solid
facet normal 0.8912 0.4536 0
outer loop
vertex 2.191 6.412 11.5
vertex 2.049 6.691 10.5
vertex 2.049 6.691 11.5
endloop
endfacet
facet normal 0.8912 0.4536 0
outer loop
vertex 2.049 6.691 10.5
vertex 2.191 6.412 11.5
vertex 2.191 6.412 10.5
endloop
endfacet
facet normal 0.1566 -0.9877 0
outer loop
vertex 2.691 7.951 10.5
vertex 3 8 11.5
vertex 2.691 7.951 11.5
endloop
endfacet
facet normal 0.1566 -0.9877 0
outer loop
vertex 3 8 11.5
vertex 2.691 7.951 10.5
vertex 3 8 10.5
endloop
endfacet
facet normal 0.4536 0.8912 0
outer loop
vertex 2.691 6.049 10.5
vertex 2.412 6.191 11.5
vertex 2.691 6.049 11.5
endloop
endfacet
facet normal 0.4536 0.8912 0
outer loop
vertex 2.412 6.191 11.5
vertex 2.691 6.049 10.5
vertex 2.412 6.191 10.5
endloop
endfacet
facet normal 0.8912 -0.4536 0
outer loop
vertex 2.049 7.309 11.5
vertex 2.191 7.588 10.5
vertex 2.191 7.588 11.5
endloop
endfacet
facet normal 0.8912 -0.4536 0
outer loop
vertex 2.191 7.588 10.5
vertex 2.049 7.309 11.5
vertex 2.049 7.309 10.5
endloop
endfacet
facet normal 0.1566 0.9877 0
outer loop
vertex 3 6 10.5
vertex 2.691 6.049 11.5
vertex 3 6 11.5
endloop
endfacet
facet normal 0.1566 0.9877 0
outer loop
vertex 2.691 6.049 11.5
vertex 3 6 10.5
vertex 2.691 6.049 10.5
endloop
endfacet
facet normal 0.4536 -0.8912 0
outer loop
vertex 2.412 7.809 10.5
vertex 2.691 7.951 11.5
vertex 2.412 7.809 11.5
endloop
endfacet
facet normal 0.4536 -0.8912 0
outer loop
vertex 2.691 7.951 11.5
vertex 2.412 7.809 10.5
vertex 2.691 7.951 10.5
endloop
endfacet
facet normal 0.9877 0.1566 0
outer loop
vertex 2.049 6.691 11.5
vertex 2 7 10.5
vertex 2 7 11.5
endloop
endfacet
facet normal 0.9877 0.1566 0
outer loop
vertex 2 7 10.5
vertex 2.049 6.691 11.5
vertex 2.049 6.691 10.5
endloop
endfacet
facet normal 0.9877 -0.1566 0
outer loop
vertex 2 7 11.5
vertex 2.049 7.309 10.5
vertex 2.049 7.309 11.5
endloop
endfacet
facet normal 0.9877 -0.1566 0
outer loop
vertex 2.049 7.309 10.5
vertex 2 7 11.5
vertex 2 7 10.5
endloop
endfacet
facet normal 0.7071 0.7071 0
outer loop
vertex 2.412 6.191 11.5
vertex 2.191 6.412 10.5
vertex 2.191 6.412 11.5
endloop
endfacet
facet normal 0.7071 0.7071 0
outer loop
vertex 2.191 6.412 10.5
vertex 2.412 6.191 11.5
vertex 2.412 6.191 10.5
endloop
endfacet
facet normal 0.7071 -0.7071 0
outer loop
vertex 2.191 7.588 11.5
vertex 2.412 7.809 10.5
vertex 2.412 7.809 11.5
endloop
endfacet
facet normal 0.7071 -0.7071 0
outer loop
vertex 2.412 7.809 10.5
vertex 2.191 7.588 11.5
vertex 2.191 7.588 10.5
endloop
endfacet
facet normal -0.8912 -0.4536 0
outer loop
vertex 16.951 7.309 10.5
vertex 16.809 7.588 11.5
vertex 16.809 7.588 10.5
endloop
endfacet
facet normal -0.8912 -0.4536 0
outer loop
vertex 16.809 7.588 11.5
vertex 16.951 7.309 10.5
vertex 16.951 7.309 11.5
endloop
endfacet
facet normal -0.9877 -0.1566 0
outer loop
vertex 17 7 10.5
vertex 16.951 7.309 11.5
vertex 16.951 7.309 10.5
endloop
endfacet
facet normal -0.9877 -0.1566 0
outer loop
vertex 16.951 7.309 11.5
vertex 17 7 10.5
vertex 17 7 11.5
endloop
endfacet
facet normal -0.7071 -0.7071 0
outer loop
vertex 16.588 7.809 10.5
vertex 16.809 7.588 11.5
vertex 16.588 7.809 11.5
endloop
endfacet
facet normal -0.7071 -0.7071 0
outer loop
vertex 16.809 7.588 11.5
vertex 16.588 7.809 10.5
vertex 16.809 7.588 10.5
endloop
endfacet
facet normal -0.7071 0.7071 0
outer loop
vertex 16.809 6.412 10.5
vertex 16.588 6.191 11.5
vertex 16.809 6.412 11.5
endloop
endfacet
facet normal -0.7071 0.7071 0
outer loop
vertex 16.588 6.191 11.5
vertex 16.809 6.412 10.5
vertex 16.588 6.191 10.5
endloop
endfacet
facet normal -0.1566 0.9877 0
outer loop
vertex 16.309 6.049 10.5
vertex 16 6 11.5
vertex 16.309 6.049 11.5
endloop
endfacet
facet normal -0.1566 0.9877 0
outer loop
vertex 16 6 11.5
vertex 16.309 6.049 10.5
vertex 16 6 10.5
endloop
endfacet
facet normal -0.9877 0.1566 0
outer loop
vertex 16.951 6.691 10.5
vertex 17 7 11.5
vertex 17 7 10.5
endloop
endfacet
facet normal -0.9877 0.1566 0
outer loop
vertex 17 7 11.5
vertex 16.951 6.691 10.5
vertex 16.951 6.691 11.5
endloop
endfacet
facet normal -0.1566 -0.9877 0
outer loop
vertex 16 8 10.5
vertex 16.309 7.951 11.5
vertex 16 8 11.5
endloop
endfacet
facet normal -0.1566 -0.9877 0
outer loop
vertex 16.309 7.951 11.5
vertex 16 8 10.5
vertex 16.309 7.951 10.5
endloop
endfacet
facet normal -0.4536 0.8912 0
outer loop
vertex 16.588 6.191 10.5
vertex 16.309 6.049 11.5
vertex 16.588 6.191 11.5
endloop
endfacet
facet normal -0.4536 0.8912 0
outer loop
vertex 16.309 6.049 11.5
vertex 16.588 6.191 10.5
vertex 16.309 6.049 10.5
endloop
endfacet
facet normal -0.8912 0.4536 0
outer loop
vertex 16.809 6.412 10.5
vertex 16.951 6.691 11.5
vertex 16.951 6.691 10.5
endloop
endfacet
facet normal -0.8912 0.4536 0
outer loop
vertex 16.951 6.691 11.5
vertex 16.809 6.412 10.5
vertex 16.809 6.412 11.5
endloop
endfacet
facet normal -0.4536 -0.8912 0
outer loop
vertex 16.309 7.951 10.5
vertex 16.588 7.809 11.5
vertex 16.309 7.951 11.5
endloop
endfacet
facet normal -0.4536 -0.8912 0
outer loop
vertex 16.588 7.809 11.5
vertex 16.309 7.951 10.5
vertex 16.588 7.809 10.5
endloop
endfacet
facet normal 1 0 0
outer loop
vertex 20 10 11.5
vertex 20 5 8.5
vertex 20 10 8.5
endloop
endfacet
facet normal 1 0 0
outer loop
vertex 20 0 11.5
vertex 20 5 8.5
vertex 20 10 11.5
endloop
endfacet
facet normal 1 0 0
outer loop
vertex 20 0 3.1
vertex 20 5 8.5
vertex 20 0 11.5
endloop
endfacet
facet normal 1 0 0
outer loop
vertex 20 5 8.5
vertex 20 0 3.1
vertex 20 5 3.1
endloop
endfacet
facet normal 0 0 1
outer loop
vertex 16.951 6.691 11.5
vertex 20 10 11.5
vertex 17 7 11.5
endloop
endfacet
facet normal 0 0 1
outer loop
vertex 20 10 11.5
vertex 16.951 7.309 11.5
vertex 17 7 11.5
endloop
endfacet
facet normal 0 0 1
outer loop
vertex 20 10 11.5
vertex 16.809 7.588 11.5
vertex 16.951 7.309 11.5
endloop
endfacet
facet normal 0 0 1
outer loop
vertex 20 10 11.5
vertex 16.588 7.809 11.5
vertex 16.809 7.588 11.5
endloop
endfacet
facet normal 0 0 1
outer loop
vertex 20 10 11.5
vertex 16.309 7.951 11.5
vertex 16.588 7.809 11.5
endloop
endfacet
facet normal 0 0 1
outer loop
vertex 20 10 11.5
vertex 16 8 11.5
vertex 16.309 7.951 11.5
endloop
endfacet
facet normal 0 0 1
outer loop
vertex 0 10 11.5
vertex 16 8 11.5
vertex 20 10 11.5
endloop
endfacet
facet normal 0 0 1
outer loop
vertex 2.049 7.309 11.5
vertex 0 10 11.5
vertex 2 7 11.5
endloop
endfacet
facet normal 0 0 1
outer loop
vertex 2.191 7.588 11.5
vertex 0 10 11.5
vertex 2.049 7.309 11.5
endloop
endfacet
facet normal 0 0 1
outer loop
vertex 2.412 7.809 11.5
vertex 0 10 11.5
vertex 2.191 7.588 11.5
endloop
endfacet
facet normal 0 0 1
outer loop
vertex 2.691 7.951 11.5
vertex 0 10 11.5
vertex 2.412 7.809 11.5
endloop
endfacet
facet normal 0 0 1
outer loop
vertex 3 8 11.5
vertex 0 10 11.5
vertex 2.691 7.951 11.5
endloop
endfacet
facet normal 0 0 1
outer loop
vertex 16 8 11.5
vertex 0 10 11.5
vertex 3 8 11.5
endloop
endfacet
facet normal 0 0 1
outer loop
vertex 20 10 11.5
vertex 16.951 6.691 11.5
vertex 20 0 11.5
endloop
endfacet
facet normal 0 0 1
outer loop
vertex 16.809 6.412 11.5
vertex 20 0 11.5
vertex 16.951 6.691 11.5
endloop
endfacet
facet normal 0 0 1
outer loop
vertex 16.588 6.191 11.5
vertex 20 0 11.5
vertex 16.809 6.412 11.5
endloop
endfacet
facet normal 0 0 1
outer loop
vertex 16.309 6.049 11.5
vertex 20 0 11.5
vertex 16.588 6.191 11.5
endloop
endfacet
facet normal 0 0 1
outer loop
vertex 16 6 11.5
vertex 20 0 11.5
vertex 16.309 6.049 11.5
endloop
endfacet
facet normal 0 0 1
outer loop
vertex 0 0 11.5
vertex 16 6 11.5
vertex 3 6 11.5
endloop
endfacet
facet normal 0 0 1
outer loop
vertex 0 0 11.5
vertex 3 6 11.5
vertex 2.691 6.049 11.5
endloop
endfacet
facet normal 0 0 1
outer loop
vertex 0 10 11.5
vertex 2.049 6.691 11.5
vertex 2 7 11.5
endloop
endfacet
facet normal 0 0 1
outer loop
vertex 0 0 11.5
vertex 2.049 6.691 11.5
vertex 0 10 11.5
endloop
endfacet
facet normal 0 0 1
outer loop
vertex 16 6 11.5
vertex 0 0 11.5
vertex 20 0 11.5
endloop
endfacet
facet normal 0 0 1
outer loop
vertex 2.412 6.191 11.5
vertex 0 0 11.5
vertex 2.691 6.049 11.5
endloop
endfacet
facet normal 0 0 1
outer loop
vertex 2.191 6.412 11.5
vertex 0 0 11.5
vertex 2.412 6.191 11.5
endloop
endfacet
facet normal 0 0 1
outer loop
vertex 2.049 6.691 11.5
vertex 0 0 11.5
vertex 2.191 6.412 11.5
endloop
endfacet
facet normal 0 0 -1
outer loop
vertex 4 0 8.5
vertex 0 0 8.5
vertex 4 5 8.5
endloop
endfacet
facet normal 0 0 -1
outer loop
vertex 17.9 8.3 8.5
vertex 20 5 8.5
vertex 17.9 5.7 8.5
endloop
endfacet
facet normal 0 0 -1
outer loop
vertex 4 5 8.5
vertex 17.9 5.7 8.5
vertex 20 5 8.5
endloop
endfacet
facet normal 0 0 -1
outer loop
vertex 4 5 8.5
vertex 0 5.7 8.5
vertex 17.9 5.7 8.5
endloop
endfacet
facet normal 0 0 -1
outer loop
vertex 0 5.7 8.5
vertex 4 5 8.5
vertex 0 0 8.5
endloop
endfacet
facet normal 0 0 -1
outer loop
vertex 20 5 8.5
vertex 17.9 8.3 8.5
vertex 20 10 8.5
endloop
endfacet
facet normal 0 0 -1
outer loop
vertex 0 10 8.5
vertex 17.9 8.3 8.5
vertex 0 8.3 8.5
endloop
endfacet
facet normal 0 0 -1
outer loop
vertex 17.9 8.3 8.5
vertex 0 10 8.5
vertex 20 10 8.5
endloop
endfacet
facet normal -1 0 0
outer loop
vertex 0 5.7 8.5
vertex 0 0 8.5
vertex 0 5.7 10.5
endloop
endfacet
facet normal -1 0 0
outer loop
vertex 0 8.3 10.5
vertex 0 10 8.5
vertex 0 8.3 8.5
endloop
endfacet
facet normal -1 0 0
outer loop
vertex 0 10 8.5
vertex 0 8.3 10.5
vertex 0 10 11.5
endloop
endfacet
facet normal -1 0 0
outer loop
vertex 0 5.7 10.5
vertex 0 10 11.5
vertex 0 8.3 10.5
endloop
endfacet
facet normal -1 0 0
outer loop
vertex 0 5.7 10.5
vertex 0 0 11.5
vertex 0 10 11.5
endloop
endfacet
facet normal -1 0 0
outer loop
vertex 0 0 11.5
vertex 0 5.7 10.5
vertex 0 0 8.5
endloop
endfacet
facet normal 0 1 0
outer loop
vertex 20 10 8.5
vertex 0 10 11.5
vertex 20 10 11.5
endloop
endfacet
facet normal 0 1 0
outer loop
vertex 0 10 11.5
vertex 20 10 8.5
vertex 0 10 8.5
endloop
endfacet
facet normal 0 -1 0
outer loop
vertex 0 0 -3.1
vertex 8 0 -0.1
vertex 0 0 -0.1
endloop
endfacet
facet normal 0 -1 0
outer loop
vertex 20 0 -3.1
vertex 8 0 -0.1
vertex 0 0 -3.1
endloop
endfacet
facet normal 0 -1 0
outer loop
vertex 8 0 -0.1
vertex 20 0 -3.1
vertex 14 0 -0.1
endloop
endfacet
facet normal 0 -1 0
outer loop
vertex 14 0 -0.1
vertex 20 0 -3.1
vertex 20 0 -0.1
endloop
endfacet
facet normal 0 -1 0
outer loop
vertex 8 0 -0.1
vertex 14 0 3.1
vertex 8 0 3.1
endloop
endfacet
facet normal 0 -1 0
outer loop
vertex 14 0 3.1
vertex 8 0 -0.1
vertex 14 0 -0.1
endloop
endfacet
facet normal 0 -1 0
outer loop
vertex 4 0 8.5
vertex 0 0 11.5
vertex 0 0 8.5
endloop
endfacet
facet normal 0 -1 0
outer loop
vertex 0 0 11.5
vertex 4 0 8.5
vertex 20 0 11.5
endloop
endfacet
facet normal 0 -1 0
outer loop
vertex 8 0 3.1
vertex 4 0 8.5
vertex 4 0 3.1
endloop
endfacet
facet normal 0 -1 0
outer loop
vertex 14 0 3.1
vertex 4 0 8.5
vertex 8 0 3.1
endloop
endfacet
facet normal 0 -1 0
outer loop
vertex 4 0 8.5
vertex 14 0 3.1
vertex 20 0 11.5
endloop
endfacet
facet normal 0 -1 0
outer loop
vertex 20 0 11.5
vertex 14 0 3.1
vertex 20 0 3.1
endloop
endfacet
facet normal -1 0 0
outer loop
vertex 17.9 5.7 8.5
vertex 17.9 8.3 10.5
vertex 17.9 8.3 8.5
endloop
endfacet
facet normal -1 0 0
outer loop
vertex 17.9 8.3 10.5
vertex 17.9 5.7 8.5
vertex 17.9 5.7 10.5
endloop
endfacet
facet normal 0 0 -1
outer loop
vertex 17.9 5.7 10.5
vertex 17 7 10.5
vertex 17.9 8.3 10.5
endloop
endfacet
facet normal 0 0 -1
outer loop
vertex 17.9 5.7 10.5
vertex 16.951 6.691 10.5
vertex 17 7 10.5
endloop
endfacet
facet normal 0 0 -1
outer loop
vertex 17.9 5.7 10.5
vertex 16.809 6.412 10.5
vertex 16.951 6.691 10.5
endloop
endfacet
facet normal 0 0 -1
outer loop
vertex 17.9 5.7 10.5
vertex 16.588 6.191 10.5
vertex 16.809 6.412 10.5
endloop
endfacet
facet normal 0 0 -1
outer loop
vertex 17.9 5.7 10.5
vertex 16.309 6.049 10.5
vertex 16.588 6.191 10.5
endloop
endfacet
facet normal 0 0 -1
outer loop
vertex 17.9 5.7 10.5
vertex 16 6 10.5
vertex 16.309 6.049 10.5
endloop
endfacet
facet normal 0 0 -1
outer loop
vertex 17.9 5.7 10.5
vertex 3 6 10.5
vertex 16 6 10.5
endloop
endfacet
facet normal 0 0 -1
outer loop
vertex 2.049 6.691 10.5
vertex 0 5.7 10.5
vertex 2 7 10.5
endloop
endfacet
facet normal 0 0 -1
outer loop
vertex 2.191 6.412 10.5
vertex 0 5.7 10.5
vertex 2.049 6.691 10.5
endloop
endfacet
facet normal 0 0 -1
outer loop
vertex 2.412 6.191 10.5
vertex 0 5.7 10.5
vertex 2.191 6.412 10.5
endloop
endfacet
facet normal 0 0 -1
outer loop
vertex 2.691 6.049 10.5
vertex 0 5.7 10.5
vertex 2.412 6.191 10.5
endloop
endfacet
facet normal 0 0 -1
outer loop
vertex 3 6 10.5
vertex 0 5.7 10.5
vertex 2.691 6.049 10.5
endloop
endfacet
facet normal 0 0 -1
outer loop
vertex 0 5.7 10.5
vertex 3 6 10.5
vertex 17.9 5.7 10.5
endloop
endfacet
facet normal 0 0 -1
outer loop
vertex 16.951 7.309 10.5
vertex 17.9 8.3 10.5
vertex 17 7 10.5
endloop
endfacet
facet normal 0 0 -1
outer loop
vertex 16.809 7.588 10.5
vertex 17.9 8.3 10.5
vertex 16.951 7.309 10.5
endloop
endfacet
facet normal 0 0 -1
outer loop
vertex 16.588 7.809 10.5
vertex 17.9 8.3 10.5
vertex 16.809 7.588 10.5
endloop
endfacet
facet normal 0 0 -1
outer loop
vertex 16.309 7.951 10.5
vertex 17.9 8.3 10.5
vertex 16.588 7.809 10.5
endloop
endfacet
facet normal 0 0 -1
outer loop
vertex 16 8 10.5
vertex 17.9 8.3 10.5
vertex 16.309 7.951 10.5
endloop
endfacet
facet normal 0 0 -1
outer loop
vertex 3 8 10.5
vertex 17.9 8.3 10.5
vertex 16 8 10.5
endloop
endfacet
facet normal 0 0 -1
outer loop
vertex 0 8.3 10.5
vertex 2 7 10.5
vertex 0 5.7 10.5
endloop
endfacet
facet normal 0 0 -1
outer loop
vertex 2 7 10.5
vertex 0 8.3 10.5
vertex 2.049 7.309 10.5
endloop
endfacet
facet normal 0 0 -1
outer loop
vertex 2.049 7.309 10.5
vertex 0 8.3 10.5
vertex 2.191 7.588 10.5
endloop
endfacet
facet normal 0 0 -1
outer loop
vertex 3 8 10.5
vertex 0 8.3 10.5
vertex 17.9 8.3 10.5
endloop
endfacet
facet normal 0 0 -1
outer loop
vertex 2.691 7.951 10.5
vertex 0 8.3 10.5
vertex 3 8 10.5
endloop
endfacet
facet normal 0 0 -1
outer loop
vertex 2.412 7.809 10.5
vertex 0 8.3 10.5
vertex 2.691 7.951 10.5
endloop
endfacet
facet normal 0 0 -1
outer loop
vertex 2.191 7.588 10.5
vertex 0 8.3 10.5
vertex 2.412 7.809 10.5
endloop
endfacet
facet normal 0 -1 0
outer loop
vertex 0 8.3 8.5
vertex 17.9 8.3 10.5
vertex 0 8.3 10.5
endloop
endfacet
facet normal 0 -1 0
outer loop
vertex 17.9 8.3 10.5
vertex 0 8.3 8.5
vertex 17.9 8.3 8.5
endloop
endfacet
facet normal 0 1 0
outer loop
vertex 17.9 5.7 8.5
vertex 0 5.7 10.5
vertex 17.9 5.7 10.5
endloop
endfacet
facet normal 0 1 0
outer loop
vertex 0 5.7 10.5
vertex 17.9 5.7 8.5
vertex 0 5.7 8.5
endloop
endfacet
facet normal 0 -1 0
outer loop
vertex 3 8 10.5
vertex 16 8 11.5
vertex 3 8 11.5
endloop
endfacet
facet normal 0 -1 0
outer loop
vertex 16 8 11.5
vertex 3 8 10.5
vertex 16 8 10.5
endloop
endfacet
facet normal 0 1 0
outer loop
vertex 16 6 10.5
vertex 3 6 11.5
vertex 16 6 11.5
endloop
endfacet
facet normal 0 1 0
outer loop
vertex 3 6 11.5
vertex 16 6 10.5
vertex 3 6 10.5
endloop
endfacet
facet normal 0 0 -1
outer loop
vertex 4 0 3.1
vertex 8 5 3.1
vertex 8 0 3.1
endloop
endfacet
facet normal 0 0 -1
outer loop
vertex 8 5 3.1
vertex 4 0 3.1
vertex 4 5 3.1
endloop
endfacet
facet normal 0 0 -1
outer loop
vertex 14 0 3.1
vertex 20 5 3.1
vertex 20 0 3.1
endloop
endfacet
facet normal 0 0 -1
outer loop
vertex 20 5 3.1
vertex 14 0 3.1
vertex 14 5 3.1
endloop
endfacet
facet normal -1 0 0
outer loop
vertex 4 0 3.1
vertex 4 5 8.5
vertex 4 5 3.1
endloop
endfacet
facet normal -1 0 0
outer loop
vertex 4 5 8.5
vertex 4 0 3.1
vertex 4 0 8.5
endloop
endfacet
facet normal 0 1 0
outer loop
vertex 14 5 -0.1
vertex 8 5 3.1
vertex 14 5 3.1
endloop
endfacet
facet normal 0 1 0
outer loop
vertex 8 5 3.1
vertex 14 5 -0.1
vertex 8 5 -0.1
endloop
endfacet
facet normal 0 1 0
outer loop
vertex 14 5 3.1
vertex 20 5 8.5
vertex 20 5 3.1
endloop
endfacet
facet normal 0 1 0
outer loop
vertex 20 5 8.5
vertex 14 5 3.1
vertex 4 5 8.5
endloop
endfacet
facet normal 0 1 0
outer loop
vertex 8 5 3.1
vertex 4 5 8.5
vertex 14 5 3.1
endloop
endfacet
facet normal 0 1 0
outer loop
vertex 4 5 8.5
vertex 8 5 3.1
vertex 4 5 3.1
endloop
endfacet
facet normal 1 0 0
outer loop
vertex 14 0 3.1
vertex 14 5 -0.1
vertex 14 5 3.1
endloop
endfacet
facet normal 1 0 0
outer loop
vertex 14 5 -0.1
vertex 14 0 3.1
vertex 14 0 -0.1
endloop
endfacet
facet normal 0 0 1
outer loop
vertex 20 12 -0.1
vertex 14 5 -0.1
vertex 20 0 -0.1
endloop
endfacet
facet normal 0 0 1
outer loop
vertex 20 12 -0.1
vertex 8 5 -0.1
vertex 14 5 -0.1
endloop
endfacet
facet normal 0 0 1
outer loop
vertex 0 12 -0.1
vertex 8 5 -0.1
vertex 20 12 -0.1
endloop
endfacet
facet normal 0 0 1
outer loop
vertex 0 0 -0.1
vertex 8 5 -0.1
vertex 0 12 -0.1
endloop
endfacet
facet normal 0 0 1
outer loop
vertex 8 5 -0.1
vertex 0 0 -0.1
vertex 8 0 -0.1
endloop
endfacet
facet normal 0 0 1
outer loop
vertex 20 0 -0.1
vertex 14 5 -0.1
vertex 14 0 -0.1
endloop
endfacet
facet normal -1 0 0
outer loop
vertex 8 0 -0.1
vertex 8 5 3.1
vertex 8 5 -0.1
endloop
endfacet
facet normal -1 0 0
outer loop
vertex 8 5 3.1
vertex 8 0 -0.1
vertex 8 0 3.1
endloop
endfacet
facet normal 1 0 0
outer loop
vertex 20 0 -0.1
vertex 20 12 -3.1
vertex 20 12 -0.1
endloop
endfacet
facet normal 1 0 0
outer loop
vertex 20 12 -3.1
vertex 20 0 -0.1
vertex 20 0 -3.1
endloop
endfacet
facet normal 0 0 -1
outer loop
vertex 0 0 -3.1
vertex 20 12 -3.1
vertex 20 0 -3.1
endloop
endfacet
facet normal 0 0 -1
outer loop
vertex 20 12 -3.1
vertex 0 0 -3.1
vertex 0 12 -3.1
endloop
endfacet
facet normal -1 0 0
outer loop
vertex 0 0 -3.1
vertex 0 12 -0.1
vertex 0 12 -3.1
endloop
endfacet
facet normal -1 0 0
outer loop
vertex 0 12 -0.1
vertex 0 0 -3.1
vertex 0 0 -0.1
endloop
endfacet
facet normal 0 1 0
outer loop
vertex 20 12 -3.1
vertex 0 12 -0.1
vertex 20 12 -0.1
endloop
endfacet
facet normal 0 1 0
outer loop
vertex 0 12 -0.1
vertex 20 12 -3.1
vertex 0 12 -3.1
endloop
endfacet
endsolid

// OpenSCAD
// Author    KMS - Martin Dubois, P.Eng.
// Copyright (C) 2021 KMS
// Product   EthCAN
// File      Hardware/Tool_Prog.scad

// Bottom();
Top();

// Private
/////////////////////////////////////////////////////////////////////////////

module Bottom()
{
    color( "grey" )
    {
        difference()
        {
            translate( [ 0, - HANDLE_Y, 0 ] )
                cube( [ SIZE_X, HANDLE_Y + SIZE_Y + 2, TICK_Z ] );

            translate( [ 8 - SPACE, - SPACE, - EPS ] )
                cube( [ 2 * SPACE + 6, SPACE + SIZE_Y + 2 + EPS, 2 * EPS + TICK_Z ] );

            translate( [ - EPS, SIZE_Y + 3, 0 ] )
            {
                rotate( [ 45, 0, 0 ] )
                    cube( [ 2 * EPS + SIZE_X, 3, 5 ] );
            }
        }

        translate( [ 0, - HANDLE_Y, TICK_Z ] )
            cube( [ SIZE_X, 2, 2 ] );
    }
}

module Top()
{
    translate( [ 4, 0, TICK_Z + SPACE ] )
        cube( [ SIZE_X - 4, TICK_Y, BOARD_Z + HEIGHT ] );

    translate( [ 8, 0, - SPACE ] )
        cube( [ 6, TICK_Y, 2 * SPACE + TICK_Z ] );

    translate( [ 0, 0, - SPACE - TICK_Z ] )
        cube( [ SIZE_X, SIZE_Y, TICK_Z ] );

    difference()
    {
        translate( [ 0, 0, TICK_Z + BOARD_Z + HEIGHT ] )
            cube( [ SIZE_X, 10, TICK_Z ] );

        translate( [ - EPS, HOLE_Y - 1.3, TICK_Z + BOARD_Z + HEIGHT - EPS ] )
            cube( [ SIZE_X - 2, 2.6, 2 + EPS ] );

        for ( x = [ 0, 13 ] )
        {
            translate( [ x + 3, HOLE_Y, TICK_Z + BOARD_Z + HEIGHT ] )
                cylinder( 4 + EPS, HOLE_R, HOLE_R, $fn = 20 );
        }

        translate( [ 3, HOLE_Y - 1, TICK_Z + BOARD_Z + HEIGHT ] )
            cube( [ 13, 2 * HOLE_R, 4 + EPS ] );
    }
}

BOARD_Z = 1.5;

EPS = 0.1;

HANDLE_Y = 6;

HEIGHT = 4;

HOLE_R = 1;
HOLE_Y = 7;

SIZE_X = 20;
SIZE_Y = 12;

SPACE = 0.1;

TICK_Y = 5;
TICK_Z = 3;
